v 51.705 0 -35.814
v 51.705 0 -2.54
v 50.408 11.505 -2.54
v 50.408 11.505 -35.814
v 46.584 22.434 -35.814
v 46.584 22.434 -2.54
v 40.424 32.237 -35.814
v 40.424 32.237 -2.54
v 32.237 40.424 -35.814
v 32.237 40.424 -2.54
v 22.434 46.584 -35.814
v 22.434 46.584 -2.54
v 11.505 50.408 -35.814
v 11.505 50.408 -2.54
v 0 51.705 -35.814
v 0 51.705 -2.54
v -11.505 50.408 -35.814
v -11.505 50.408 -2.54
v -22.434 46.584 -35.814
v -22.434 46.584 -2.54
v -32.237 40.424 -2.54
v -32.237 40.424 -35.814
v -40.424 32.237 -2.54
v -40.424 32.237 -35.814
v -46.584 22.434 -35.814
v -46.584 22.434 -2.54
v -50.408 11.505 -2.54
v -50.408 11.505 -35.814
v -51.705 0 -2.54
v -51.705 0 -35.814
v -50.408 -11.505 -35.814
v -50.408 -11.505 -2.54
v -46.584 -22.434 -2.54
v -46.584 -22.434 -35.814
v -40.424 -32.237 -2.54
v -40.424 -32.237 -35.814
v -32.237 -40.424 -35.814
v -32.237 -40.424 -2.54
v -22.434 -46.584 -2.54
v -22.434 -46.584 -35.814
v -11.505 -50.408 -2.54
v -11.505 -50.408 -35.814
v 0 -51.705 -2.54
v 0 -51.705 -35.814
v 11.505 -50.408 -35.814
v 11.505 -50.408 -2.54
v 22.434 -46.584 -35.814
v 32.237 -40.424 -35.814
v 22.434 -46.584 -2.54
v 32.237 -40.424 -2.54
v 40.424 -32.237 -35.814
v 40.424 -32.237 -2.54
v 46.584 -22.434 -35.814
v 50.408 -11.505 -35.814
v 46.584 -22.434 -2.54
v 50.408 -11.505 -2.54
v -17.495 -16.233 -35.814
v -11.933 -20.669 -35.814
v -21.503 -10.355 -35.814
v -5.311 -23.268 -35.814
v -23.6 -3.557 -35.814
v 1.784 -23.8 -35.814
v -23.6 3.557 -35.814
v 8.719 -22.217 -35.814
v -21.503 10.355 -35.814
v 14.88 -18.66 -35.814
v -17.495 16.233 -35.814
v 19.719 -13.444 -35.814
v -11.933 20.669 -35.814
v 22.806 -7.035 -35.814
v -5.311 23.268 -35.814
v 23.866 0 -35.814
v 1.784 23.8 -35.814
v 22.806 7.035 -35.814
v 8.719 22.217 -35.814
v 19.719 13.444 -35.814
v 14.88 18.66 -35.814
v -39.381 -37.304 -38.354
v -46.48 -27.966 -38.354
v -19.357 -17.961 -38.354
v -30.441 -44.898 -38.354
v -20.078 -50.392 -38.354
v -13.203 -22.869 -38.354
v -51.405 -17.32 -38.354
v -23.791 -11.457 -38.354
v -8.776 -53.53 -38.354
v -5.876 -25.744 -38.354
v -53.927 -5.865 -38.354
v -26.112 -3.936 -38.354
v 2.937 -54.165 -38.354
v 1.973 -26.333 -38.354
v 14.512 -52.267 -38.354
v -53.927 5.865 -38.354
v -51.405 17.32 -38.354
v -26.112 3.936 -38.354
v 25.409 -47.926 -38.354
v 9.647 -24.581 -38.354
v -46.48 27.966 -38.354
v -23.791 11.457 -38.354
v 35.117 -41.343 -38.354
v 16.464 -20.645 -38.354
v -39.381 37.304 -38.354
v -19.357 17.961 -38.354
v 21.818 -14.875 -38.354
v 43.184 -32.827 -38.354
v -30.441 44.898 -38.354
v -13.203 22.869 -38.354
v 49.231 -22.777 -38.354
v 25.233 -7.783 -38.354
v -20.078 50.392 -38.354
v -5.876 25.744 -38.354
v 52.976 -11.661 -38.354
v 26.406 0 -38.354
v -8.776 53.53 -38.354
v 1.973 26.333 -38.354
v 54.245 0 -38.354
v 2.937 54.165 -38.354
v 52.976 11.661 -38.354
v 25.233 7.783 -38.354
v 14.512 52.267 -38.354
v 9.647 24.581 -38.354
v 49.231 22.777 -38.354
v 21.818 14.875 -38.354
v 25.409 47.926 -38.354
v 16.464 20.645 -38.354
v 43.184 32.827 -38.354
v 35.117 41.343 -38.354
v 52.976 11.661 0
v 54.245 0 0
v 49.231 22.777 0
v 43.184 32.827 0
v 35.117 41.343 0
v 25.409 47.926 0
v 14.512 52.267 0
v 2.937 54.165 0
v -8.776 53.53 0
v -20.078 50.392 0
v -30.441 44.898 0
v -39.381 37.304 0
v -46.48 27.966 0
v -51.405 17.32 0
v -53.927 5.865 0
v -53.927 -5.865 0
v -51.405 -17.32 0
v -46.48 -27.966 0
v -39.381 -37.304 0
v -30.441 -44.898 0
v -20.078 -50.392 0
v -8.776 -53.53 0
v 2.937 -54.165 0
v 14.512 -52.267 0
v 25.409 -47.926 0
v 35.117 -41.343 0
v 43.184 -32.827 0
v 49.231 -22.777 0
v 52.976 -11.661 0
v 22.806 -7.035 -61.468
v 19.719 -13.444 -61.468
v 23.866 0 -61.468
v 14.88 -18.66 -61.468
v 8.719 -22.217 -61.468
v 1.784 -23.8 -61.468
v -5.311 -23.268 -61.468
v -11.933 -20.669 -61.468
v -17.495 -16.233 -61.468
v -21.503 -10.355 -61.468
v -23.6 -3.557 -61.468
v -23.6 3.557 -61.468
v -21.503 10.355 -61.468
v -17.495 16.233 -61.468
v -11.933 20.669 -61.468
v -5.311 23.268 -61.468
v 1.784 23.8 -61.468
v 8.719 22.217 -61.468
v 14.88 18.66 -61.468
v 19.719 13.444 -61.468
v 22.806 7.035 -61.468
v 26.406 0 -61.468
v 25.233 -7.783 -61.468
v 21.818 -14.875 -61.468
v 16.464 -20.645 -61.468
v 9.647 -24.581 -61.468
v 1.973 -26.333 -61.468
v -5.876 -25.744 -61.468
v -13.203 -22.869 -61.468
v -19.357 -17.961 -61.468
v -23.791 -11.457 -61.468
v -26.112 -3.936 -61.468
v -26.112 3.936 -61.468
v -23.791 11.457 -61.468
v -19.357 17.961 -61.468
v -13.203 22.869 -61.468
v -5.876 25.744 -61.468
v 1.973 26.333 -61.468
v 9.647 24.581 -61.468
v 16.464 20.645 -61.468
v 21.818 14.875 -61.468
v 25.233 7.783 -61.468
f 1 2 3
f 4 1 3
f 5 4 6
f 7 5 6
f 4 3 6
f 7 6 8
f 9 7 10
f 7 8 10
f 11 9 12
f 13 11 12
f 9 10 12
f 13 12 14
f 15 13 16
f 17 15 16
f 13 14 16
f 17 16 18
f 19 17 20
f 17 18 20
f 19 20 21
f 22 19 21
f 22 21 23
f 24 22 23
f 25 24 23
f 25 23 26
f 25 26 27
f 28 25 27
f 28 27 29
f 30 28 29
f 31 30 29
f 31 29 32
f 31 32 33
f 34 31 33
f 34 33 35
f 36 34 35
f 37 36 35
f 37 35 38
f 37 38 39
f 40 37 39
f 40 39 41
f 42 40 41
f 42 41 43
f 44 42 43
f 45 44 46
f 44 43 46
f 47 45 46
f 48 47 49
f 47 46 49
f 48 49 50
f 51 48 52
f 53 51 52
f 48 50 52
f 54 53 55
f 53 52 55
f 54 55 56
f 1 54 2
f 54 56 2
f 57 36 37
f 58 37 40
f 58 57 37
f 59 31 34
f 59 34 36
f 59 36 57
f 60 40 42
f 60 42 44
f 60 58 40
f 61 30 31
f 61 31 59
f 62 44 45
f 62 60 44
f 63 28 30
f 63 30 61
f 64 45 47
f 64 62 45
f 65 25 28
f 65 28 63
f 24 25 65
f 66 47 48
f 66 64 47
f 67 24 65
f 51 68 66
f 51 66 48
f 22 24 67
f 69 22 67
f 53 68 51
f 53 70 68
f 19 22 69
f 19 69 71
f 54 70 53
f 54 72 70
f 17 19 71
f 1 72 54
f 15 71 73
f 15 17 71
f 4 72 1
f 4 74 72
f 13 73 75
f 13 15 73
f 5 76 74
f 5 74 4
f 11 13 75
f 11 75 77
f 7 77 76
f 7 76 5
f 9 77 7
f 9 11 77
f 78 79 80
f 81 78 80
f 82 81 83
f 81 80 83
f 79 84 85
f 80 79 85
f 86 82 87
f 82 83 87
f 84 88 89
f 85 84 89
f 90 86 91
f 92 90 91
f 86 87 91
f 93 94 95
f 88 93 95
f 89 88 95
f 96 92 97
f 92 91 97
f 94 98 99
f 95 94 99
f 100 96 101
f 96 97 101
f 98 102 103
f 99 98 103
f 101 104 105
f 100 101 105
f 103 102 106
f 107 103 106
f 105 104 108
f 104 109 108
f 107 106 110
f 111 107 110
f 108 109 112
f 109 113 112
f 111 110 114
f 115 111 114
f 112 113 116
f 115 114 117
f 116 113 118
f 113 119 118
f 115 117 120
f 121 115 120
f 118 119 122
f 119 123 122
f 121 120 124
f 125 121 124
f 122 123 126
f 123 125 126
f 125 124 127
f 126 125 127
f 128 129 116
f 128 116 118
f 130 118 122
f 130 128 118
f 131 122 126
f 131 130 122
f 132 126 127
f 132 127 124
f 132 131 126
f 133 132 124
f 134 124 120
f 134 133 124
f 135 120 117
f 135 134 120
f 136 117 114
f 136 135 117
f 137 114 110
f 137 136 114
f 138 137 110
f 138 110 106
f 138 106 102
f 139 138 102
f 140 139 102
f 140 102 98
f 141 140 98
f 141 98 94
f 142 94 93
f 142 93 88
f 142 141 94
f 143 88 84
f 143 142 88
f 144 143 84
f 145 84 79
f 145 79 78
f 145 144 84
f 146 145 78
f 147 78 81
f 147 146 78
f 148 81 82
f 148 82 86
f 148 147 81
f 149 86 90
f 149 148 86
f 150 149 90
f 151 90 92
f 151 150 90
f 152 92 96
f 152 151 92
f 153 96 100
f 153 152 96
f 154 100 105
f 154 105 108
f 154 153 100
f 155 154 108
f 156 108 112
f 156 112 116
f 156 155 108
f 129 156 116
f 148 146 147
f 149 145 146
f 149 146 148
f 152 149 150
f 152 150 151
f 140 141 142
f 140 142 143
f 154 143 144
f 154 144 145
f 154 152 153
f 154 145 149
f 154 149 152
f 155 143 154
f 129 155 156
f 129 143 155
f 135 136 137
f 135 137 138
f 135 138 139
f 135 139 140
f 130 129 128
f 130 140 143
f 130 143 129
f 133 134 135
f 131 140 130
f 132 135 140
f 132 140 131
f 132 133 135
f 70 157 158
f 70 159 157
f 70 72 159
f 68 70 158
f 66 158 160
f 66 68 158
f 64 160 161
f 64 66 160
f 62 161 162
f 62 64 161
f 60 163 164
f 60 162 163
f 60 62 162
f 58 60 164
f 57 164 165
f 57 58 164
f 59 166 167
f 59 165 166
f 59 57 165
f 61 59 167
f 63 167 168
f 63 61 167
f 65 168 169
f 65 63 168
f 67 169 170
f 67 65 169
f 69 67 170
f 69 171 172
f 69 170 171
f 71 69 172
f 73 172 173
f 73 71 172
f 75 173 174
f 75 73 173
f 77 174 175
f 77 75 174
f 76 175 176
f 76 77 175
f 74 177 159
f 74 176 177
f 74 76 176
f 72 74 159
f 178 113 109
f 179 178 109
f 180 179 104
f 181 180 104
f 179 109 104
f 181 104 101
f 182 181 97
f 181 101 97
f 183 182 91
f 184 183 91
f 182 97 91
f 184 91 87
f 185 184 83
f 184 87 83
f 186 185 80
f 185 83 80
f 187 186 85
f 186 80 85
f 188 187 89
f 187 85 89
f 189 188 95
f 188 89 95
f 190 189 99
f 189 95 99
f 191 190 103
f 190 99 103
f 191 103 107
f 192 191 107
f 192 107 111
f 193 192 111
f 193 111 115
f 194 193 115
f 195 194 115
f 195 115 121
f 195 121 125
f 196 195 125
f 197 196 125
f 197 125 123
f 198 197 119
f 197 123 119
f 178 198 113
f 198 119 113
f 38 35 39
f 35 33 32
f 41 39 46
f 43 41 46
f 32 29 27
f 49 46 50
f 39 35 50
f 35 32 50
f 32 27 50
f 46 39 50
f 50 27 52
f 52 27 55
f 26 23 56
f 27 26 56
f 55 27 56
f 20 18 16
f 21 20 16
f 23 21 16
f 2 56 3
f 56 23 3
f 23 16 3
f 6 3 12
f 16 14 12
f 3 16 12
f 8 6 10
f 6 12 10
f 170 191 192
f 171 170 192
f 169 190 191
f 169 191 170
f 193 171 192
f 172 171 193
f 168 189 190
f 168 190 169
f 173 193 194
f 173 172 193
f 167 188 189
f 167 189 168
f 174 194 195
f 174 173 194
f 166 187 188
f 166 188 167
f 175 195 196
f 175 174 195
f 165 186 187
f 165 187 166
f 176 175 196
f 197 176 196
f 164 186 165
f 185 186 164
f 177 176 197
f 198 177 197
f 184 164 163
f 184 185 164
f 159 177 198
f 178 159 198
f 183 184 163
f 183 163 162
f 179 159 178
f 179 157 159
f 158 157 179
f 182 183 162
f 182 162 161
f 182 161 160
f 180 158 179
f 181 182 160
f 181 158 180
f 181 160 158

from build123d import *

# Parameters (mm, degrees)
F0_R     = 54.2445542545
F1_DEPTH = 38.354
F2_R     = 26.4064404113
F3_DEPTH = 23.114
F4_T     = -2.54


with BuildPart() as f1:
    # F0 (on Top) → F1 (new body)
    with BuildSketch(Plane.XY):
        Circle(F0_R)
    extrude(amount=-F1_DEPTH)

    # F2 (on face) → F3 (join)
    with BuildSketch(Plane(origin=(0, 0, -38.354), x_dir=(1, 0, 0), z_dir=(0, 0, -1))):
        Circle(F2_R)
    extrude(amount=F3_DEPTH)

    # F4
    f4_openings = [f1.faces().sort_by_distance(p)[0] for p in [
        (0, 0, -61.468),
    ]]
    offset(amount=F4_T, openings=f4_openings, kind=Kind.INTERSECTION)


solid = f1.part
